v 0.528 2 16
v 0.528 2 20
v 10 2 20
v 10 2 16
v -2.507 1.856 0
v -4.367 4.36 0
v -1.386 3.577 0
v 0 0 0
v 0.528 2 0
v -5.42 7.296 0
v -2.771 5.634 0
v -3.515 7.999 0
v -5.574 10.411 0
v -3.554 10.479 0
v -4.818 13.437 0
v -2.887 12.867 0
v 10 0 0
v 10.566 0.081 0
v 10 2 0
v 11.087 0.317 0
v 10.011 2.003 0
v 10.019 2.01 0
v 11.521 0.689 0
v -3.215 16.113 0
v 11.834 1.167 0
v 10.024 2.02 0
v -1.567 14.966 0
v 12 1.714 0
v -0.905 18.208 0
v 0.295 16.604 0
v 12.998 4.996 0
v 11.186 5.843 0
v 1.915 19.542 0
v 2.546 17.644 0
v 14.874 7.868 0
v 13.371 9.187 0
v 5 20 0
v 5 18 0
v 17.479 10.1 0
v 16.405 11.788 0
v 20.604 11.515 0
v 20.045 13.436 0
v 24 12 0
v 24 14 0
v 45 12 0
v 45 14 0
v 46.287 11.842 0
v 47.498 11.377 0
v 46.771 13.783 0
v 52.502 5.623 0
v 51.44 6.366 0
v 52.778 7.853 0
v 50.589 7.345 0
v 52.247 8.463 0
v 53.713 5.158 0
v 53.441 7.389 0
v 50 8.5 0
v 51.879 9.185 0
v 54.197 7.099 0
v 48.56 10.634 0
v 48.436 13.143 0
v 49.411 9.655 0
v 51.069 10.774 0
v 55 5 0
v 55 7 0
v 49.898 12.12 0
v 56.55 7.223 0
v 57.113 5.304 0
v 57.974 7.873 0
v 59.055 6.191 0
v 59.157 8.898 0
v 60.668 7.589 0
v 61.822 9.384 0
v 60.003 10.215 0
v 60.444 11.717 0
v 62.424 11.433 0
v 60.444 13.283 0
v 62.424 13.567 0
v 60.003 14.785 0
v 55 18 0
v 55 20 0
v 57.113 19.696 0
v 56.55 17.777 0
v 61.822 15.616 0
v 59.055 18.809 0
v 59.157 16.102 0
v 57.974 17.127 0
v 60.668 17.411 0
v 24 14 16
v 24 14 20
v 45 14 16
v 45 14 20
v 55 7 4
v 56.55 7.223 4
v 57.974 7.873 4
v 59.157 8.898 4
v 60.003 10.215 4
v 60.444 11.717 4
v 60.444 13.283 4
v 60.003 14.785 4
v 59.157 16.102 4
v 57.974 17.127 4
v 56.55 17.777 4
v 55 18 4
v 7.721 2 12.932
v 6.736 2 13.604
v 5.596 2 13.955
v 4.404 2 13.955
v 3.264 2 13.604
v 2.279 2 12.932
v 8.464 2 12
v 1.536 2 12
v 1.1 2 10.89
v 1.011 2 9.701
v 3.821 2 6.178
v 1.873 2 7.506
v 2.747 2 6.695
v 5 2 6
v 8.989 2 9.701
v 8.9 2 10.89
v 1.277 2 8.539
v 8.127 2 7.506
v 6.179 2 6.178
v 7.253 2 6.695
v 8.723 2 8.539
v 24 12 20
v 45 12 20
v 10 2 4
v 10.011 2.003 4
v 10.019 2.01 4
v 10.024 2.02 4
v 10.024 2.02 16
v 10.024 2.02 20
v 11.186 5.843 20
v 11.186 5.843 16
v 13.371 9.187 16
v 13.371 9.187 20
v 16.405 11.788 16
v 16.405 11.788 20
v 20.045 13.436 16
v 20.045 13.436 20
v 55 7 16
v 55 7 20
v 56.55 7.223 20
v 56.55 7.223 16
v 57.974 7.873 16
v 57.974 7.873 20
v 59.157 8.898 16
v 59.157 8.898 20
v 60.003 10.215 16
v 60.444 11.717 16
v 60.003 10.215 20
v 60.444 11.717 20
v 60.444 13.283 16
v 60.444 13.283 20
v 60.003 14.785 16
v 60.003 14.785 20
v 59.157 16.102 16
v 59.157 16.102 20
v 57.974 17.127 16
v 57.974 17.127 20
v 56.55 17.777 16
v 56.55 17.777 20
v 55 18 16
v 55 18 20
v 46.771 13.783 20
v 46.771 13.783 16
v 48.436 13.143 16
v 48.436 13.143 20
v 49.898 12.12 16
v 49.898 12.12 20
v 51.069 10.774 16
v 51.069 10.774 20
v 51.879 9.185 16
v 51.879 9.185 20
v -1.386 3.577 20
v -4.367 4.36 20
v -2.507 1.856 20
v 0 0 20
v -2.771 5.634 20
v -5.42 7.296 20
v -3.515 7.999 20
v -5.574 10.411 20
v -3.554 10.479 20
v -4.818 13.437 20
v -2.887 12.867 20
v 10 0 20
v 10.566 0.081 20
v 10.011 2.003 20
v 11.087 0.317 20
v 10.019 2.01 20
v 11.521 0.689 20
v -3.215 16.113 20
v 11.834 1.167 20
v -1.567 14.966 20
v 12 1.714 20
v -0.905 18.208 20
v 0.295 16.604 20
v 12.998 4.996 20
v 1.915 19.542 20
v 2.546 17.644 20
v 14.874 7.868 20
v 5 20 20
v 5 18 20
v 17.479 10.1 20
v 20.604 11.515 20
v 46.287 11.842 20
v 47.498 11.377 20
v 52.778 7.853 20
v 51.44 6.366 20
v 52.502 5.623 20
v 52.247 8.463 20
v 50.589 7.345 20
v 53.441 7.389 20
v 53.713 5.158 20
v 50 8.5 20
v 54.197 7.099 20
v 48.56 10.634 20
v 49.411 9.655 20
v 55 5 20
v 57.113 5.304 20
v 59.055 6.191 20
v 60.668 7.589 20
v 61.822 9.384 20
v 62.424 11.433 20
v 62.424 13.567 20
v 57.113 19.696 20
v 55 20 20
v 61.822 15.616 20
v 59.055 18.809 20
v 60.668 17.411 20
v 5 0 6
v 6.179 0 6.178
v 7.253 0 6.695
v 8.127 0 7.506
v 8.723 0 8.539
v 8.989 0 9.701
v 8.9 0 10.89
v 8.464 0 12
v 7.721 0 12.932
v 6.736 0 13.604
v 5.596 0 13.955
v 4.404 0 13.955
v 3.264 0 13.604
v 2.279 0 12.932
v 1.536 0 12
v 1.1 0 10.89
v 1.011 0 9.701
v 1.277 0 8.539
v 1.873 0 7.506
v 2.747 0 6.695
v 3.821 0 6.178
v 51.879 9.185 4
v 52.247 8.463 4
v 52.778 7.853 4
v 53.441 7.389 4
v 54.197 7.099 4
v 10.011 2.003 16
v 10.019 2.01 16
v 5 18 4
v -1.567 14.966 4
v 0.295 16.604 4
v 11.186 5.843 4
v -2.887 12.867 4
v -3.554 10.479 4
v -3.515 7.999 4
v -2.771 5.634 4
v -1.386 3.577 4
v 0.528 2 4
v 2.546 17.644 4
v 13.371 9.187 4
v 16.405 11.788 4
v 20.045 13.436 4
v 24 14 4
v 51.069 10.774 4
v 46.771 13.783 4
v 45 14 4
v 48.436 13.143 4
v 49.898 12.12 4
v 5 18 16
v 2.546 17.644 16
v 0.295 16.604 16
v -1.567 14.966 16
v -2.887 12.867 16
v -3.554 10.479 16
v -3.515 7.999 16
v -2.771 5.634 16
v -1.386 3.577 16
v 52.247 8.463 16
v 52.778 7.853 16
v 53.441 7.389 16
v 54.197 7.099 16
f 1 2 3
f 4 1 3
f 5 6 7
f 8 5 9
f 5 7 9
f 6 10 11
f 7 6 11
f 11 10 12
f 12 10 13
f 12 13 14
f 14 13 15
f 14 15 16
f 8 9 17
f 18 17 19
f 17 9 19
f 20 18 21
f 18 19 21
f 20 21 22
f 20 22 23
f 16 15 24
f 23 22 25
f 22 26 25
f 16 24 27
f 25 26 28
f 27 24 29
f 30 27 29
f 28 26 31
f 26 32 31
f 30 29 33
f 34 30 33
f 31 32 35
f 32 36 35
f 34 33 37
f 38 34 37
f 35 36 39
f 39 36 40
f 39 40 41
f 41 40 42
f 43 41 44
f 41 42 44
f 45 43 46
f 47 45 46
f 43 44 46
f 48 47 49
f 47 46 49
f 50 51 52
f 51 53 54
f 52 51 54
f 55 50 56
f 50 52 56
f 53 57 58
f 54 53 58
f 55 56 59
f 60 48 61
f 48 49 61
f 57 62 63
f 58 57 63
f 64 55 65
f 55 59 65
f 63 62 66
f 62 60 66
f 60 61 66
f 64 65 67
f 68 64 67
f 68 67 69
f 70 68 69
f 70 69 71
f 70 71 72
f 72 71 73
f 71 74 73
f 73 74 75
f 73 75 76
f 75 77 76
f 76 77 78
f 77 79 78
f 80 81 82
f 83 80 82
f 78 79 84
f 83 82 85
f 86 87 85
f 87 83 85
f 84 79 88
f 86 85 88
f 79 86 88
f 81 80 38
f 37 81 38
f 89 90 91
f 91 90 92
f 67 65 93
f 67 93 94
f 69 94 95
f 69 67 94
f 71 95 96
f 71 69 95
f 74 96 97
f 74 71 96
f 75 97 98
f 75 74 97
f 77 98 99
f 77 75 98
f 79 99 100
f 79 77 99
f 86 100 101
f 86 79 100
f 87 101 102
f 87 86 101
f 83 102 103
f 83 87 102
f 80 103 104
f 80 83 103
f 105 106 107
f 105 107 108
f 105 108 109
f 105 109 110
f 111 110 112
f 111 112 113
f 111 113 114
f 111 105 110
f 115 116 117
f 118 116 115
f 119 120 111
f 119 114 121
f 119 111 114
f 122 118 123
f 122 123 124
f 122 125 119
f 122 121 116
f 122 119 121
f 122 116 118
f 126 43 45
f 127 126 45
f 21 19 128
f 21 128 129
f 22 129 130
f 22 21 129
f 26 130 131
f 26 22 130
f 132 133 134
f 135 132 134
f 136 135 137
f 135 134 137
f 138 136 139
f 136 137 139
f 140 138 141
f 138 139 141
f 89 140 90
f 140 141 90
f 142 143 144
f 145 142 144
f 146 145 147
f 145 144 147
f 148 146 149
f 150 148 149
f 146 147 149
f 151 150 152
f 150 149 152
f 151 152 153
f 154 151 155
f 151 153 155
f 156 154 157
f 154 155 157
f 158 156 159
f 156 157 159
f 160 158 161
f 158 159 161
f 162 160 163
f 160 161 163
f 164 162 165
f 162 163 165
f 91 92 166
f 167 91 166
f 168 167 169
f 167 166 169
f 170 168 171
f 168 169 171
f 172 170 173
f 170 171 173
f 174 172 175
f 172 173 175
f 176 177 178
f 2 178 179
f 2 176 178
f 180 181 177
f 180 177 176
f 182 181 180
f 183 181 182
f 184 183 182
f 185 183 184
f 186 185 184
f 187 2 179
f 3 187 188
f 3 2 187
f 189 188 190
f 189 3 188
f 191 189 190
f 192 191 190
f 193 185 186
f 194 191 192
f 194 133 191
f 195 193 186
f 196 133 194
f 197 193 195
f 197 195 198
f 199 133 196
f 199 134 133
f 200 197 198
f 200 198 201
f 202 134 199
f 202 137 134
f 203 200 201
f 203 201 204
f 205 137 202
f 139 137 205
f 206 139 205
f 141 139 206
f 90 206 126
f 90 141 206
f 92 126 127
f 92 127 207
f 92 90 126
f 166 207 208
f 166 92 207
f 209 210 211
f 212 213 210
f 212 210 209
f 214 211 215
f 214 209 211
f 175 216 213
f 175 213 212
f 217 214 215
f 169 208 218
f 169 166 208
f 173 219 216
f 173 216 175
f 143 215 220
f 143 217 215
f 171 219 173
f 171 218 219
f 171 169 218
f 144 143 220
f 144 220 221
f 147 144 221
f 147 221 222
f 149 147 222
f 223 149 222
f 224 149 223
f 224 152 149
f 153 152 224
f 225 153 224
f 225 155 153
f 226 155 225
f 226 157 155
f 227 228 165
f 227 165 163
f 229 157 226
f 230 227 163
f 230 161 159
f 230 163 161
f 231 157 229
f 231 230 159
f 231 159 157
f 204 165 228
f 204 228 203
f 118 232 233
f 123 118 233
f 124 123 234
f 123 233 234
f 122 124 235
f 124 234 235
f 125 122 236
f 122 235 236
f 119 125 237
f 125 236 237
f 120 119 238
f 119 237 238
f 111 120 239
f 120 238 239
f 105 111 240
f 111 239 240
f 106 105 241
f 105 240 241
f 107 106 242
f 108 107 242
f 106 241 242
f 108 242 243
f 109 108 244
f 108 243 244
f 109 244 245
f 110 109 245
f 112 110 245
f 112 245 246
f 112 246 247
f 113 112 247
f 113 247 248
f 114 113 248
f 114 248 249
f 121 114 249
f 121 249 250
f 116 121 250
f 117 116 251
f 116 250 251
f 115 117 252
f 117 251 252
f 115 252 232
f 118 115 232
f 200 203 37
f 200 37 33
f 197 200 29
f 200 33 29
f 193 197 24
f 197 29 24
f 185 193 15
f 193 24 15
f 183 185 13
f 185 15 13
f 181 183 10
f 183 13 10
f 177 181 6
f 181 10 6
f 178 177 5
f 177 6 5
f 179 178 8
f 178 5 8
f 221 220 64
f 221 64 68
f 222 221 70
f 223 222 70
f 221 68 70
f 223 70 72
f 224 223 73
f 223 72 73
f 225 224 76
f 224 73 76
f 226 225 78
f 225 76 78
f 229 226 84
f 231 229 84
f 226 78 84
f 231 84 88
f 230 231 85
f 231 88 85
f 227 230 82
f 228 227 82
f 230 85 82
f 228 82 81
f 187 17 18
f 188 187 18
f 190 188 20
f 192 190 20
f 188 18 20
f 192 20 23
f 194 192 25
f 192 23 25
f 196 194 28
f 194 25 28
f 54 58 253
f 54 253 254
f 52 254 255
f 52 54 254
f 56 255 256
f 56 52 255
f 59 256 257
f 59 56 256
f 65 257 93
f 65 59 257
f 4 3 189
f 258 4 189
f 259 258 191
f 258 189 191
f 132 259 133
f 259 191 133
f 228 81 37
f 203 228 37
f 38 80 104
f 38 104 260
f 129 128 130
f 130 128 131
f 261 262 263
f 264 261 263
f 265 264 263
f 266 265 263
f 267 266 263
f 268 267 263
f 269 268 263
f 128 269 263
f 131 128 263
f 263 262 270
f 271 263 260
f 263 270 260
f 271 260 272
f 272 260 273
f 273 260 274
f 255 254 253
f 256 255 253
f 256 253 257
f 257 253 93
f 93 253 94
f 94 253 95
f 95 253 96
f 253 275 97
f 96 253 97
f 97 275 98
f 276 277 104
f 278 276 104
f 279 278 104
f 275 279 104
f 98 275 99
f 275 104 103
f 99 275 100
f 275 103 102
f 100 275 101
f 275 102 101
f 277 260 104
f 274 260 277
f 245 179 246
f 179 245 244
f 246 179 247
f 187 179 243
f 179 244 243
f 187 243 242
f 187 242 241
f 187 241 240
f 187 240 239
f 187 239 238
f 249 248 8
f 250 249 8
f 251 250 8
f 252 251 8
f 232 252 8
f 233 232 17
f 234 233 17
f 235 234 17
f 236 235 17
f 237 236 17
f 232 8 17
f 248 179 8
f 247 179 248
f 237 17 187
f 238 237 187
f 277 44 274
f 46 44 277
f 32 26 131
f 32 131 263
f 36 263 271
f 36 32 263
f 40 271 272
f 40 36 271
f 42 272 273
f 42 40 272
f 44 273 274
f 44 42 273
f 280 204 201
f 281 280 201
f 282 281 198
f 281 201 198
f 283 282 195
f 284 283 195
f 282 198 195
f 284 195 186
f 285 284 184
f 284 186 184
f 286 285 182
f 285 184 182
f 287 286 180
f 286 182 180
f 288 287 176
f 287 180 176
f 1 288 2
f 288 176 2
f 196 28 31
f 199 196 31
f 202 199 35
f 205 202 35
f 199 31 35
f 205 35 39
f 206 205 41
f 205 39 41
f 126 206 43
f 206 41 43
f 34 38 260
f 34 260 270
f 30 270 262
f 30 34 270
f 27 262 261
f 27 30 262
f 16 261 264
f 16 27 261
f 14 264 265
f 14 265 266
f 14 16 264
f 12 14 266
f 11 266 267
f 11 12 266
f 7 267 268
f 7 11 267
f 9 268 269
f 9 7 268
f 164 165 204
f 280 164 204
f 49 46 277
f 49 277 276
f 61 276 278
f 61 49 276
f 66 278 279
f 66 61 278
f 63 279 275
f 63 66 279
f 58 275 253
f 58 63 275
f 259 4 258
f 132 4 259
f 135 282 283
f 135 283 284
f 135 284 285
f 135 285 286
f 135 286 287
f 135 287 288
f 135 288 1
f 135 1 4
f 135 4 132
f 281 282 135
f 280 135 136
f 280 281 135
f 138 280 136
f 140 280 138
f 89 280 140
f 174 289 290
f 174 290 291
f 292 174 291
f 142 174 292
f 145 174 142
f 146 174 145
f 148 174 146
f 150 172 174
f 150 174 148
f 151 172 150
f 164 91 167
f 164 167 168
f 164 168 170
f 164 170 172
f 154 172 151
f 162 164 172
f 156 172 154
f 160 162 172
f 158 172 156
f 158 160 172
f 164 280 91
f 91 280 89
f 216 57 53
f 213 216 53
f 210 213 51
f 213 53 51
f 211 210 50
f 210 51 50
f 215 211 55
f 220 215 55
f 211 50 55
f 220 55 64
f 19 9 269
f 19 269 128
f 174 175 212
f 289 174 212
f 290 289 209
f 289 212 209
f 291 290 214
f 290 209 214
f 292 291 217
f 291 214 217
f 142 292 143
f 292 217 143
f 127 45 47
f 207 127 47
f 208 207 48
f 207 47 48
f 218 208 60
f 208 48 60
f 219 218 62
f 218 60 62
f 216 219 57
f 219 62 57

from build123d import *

# Parameters (mm, degrees)
BOSS_EXTRUDE1_DEPTH = 20
CUT_EXTRUDE1_DEPTH  = 4
SKETCH4_R           = 4
CUT_EXTRUDE2_DEPTH  = 2


with BuildPart() as part:
    # Sketch1 → Boss-Extrude1 (new body)
    with BuildSketch(Plane.XY):
        with BuildLine():
            Line((0, 0), (10, 0))
            ThreePointArc((10, 0), (11.31707778, 0.487218781), (12, 1.714285714))
            ThreePointArc((12, 1.714285714), (16.097533322, 9.076687314), (24, 12))
            Line((24, 12), (45, 12))
            ThreePointArc((45, 12), (48.051638904, 11.038055577), (50, 8.5))
            ThreePointArc((50, 8.5), (51.948361096, 5.961944423), (55, 5))
            ThreePointArc((55, 5), (62.5, 12.5), (55, 20))
            Line((55, 20), (5, 20))
            ThreePointArc((5, 20), (-5.307764064, 11.951941016), (0, 0))
        make_face()
    extrude(amount=BOSS_EXTRUDE1_DEPTH)

    # Sketch3 → Cut-Extrude1 (cut)
    with BuildSketch(Plane.XY.offset(20)):
        with BuildLine():
            Line((24, 14), (45, 14))
            ThreePointArc((45, 14), (49.198563593, 12.676519418), (51.879194631, 9.184563758))
            ThreePointArc((51.879194631, 9.184563758), (53.095285785, 7.600408264), (55, 7))
            ThreePointArc((55, 7), (60.5, 12.5), (55, 18))
            Line((55, 18), (5, 18))
            ThreePointArc((5, 18), (-3.306623863, 11.696771953), (0.527864045, 2))
            Line((0.527864045, 2), (10, 2))
            ThreePointArc((10, 2), (10.015495033, 2.005731986), (10.023529412, 2.020168067))
            ThreePointArc((10.023529412, 2.020168067), (14.795950575, 10.595200519), (24, 14))
        make_face()
    cut_extrude1 = extrude(amount=-CUT_EXTRUDE1_DEPTH, mode=Mode.SUBTRACT)

    # Mirror1: Cut-Extrude1 across plane
    add(cut_extrude1.mirror(Plane.XY.offset(10)), mode=Mode.SUBTRACT)

    # Sketch4 → Cut-Extrude2 (cut)
    with BuildSketch(Plane(origin=(0, 0, 0), x_dir=(-1, 0, 0), z_dir=(0, -1, 0))):
        with Locations(Location((-5, -10, 0), (0, 0, 90))):
            Circle(SKETCH4_R)
    extrude(amount=-CUT_EXTRUDE2_DEPTH, mode=Mode.SUBTRACT)


solid = part.part
